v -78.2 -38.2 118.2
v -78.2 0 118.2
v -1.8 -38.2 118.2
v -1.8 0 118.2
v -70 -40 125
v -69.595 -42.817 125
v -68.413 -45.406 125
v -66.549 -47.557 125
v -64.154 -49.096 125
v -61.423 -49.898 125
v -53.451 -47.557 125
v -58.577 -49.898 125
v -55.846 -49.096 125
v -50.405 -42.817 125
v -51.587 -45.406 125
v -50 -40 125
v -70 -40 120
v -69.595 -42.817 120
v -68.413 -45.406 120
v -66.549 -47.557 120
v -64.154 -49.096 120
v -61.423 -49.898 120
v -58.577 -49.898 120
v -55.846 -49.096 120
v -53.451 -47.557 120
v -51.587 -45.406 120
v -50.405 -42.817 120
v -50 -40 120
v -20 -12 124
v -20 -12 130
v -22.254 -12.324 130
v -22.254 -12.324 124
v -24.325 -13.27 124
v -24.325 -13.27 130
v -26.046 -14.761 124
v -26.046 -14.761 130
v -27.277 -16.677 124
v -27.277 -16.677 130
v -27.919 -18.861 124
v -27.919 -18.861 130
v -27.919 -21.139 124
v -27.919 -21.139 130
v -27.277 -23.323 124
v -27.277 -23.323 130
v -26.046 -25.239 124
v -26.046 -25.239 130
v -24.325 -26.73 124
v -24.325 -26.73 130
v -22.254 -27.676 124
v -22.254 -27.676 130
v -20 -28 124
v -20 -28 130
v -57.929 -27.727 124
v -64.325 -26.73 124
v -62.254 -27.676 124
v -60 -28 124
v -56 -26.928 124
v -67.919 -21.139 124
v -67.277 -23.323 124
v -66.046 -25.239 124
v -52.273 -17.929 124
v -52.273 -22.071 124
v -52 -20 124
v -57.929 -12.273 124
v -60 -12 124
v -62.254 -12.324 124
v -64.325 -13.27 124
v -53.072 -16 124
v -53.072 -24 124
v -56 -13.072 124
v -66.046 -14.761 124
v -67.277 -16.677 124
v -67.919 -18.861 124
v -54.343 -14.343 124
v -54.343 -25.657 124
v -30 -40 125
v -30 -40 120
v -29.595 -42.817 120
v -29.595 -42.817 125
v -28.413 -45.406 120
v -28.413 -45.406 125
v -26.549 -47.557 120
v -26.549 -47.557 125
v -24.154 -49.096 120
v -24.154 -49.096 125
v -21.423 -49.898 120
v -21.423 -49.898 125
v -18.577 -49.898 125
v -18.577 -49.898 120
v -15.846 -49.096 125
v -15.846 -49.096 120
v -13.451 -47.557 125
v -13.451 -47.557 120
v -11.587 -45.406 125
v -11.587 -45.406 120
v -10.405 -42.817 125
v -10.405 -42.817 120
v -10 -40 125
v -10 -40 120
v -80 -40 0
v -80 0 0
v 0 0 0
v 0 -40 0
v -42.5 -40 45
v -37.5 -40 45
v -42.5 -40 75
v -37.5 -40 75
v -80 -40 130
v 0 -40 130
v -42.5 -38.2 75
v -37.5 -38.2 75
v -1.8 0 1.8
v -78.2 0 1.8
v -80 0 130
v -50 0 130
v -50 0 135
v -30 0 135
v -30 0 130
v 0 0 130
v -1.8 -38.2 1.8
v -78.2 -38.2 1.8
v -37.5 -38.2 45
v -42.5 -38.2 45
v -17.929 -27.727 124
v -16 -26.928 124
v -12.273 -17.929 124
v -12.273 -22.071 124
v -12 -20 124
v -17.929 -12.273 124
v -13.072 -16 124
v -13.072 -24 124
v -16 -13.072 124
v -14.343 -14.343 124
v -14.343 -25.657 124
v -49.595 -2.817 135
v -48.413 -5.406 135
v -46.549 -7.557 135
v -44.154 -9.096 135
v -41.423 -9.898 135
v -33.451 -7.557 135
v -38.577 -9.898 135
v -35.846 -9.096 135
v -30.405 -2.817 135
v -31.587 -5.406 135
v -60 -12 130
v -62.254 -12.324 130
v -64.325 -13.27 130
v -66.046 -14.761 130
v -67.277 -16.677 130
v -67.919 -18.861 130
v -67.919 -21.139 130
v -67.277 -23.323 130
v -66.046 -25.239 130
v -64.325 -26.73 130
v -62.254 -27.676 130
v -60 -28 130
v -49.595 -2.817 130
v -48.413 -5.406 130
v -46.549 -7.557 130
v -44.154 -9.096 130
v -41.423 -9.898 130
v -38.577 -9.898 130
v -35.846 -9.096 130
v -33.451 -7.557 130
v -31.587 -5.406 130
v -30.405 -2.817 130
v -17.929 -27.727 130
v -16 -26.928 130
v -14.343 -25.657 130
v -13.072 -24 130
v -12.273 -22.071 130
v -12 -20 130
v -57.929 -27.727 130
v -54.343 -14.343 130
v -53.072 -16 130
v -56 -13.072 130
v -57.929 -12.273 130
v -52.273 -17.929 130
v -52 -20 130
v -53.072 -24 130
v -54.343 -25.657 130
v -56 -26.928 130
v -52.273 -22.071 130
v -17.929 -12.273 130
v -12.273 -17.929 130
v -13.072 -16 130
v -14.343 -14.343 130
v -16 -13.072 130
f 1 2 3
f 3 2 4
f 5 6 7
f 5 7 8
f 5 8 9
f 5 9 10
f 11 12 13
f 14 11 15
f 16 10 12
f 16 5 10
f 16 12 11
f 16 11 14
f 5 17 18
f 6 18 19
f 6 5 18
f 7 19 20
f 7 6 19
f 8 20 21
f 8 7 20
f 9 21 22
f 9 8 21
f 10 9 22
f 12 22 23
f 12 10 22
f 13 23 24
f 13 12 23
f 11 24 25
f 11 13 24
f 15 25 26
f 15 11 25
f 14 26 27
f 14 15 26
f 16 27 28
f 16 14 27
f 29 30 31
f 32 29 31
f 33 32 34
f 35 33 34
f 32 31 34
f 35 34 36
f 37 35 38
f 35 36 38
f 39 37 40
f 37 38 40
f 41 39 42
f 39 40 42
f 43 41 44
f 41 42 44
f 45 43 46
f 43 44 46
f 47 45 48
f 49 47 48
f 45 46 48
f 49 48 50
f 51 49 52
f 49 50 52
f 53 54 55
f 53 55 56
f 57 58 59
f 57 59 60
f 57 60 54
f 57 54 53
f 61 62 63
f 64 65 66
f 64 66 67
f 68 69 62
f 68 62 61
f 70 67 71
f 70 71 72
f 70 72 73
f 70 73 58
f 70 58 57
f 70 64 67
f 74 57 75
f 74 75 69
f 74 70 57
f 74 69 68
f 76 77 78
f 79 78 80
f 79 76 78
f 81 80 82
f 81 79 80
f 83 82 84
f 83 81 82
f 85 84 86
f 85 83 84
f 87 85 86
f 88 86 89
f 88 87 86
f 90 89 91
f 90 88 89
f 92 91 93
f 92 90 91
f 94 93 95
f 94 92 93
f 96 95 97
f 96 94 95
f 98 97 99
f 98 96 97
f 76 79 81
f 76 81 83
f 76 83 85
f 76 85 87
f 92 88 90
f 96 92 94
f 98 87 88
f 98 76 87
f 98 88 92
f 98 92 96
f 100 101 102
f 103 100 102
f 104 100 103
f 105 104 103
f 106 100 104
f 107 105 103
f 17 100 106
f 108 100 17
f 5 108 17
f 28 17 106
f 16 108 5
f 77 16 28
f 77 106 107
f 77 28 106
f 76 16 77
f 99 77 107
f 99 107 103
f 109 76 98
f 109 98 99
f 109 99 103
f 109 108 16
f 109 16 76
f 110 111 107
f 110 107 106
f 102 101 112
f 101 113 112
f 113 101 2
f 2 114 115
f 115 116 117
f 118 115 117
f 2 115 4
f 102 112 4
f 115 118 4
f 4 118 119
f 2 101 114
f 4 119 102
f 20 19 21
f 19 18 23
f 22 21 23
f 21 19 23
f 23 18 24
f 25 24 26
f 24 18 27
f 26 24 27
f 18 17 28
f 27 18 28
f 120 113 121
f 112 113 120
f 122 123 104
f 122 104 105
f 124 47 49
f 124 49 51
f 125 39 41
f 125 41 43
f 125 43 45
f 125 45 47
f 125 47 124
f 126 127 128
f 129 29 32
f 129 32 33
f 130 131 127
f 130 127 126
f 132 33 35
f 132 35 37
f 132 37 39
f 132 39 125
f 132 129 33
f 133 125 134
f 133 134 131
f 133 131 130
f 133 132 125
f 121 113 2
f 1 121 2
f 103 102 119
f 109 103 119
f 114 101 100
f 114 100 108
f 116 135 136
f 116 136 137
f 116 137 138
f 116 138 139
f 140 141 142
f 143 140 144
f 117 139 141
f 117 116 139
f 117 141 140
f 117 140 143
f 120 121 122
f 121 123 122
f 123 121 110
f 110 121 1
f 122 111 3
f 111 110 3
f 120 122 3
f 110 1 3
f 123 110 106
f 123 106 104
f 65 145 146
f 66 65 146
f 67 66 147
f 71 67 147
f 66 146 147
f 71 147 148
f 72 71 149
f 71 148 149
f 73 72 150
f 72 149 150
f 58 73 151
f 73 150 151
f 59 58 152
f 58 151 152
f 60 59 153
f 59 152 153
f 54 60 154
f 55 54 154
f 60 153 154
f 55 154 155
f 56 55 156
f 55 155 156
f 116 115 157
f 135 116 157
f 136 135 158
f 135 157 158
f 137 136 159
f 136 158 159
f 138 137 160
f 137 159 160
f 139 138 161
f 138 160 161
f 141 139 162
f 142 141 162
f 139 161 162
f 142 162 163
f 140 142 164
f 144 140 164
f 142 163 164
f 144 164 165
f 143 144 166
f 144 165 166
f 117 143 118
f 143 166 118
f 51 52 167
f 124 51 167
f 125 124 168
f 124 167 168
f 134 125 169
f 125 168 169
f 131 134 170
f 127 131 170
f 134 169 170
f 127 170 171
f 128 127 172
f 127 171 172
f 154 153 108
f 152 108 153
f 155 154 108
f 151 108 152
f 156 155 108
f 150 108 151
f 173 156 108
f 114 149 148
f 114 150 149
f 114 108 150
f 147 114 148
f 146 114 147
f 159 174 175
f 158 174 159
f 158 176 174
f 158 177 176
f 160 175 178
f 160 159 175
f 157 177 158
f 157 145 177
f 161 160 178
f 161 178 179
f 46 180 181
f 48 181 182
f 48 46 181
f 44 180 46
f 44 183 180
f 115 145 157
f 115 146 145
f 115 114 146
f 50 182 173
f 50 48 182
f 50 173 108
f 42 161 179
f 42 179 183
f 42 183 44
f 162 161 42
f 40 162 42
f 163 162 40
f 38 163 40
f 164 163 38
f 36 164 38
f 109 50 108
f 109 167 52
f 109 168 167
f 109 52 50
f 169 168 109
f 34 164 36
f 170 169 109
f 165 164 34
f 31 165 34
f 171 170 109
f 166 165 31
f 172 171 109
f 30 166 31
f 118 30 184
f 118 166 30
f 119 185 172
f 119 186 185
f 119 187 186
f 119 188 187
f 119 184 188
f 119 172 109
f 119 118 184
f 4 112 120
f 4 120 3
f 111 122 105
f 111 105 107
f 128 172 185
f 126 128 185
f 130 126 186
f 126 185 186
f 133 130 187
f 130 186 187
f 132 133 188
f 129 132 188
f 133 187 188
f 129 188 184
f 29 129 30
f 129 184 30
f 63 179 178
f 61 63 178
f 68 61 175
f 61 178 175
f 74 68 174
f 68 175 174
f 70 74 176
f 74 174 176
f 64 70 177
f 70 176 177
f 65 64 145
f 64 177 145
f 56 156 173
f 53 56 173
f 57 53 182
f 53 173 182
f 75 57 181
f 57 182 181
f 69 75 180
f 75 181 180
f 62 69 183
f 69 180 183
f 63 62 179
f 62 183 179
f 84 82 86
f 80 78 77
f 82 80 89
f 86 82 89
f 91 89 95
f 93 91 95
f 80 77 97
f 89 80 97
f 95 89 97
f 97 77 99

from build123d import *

# Parameters (mm, degrees)
F0_W      = 80
F0_H      = 120
F1_DEPTH  = 40
F2_T      = -1.8
F0_H_2    = 10
F3_DEPTH  = 40
F5_DEPTH  = 40
F8_DEPTH  = 5
F9_DEPTH  = 6
F10_DEPTH = 10
F12_DEPTH = 5


with BuildPart() as f1:
    # F0 (on Front) → F1 (new body)
    with BuildSketch(Plane.XZ):
        with Locations((-40, 60)):
            Rectangle(F0_W, F0_H)
    extrude(amount=F1_DEPTH)

    # F2
    f2_openings = [f1.faces().sort_by_distance(p)[0] for p in [
        (-40, 0, 60),
    ]]
    offset(amount=F2_T, openings=f2_openings)

    # F0 (on Front) → F3 (join)
    with BuildSketch(Plane.XZ):
        with Locations((-40, 125)):
            Rectangle(F0_W, F0_H_2)
    extrude(amount=F3_DEPTH)

    # F4 (on face) → F5 (cut)
    with BuildSketch(Plane.XZ):
        Polygon((-42.5, 45), (-40, 45), (-37.5, 45), (-37.5, 75), (-42.5, 75), align=None)
    extrude(amount=F5_DEPTH, mode=Mode.SUBTRACT)

    # F7 (on offset) → F8 (join)
    with BuildSketch(Plane.XY.offset(130)):
        with BuildLine():
            ThreePointArc((-50, 0), (-40, -10), (-30, 0))
            Line((-30, 0), (-40, 0))
            Line((-40, 0), (-50, 0))
        make_face()
    extrude(amount=F8_DEPTH)

    # F7 (on offset) → F9 (cut)
    with BuildSketch(Plane.XY.offset(130)):
        with BuildLine():
            ThreePointArc((-12, -20), (-14.343146, -14.343146), (-20, -12))
            ThreePointArc((-20, -12), (-28, -20), (-20, -28))
            ThreePointArc((-20, -28), (-14.343146, -25.656854), (-12, -20))
        make_face()
        with BuildLine():
            ThreePointArc((-52, -20), (-54.343146, -14.343146), (-60, -12))
            ThreePointArc((-60, -12), (-68, -20), (-60, -28))
            ThreePointArc((-60, -28), (-54.343146, -25.656854), (-52, -20))
        make_face()
    extrude(amount=-F9_DEPTH, mode=Mode.SUBTRACT)

    # F7 (on offset) → F10 (join)
    with BuildSketch(Plane.XY.offset(130)):
        with BuildLine():
            ThreePointArc((-50, -40), (-52.928932, -32.928932), (-60, -30))
            ThreePointArc((-60, -30), (-67.071068, -47.071068), (-50, -40))
        make_face()
        with BuildLine():
            ThreePointArc((-10, -40), (-12.928932, -32.928932), (-20, -30))
            ThreePointArc((-20, -30), (-27.071068, -47.071068), (-10, -40))
        make_face()
    extrude(amount=-F10_DEPTH)

    # F11 (on offset) → F12 (cut)
    with BuildSketch(Plane.XY.offset(130)):
        with BuildLine():
            ThreePointArc((-70, -40), (-60, -50), (-50, -40))
            Line((-50, -40), (-60, -40))
            Line((-60, -40), (-70, -40))
        make_face()
        with BuildLine():
            ThreePointArc((-30, -40), (-20, -50), (-10, -40))
            Line((-10, -40), (-20, -40))
            Line((-20, -40), (-30, -40))
        make_face()
    extrude(amount=-F12_DEPTH, mode=Mode.SUBTRACT)


solid = f1.part
